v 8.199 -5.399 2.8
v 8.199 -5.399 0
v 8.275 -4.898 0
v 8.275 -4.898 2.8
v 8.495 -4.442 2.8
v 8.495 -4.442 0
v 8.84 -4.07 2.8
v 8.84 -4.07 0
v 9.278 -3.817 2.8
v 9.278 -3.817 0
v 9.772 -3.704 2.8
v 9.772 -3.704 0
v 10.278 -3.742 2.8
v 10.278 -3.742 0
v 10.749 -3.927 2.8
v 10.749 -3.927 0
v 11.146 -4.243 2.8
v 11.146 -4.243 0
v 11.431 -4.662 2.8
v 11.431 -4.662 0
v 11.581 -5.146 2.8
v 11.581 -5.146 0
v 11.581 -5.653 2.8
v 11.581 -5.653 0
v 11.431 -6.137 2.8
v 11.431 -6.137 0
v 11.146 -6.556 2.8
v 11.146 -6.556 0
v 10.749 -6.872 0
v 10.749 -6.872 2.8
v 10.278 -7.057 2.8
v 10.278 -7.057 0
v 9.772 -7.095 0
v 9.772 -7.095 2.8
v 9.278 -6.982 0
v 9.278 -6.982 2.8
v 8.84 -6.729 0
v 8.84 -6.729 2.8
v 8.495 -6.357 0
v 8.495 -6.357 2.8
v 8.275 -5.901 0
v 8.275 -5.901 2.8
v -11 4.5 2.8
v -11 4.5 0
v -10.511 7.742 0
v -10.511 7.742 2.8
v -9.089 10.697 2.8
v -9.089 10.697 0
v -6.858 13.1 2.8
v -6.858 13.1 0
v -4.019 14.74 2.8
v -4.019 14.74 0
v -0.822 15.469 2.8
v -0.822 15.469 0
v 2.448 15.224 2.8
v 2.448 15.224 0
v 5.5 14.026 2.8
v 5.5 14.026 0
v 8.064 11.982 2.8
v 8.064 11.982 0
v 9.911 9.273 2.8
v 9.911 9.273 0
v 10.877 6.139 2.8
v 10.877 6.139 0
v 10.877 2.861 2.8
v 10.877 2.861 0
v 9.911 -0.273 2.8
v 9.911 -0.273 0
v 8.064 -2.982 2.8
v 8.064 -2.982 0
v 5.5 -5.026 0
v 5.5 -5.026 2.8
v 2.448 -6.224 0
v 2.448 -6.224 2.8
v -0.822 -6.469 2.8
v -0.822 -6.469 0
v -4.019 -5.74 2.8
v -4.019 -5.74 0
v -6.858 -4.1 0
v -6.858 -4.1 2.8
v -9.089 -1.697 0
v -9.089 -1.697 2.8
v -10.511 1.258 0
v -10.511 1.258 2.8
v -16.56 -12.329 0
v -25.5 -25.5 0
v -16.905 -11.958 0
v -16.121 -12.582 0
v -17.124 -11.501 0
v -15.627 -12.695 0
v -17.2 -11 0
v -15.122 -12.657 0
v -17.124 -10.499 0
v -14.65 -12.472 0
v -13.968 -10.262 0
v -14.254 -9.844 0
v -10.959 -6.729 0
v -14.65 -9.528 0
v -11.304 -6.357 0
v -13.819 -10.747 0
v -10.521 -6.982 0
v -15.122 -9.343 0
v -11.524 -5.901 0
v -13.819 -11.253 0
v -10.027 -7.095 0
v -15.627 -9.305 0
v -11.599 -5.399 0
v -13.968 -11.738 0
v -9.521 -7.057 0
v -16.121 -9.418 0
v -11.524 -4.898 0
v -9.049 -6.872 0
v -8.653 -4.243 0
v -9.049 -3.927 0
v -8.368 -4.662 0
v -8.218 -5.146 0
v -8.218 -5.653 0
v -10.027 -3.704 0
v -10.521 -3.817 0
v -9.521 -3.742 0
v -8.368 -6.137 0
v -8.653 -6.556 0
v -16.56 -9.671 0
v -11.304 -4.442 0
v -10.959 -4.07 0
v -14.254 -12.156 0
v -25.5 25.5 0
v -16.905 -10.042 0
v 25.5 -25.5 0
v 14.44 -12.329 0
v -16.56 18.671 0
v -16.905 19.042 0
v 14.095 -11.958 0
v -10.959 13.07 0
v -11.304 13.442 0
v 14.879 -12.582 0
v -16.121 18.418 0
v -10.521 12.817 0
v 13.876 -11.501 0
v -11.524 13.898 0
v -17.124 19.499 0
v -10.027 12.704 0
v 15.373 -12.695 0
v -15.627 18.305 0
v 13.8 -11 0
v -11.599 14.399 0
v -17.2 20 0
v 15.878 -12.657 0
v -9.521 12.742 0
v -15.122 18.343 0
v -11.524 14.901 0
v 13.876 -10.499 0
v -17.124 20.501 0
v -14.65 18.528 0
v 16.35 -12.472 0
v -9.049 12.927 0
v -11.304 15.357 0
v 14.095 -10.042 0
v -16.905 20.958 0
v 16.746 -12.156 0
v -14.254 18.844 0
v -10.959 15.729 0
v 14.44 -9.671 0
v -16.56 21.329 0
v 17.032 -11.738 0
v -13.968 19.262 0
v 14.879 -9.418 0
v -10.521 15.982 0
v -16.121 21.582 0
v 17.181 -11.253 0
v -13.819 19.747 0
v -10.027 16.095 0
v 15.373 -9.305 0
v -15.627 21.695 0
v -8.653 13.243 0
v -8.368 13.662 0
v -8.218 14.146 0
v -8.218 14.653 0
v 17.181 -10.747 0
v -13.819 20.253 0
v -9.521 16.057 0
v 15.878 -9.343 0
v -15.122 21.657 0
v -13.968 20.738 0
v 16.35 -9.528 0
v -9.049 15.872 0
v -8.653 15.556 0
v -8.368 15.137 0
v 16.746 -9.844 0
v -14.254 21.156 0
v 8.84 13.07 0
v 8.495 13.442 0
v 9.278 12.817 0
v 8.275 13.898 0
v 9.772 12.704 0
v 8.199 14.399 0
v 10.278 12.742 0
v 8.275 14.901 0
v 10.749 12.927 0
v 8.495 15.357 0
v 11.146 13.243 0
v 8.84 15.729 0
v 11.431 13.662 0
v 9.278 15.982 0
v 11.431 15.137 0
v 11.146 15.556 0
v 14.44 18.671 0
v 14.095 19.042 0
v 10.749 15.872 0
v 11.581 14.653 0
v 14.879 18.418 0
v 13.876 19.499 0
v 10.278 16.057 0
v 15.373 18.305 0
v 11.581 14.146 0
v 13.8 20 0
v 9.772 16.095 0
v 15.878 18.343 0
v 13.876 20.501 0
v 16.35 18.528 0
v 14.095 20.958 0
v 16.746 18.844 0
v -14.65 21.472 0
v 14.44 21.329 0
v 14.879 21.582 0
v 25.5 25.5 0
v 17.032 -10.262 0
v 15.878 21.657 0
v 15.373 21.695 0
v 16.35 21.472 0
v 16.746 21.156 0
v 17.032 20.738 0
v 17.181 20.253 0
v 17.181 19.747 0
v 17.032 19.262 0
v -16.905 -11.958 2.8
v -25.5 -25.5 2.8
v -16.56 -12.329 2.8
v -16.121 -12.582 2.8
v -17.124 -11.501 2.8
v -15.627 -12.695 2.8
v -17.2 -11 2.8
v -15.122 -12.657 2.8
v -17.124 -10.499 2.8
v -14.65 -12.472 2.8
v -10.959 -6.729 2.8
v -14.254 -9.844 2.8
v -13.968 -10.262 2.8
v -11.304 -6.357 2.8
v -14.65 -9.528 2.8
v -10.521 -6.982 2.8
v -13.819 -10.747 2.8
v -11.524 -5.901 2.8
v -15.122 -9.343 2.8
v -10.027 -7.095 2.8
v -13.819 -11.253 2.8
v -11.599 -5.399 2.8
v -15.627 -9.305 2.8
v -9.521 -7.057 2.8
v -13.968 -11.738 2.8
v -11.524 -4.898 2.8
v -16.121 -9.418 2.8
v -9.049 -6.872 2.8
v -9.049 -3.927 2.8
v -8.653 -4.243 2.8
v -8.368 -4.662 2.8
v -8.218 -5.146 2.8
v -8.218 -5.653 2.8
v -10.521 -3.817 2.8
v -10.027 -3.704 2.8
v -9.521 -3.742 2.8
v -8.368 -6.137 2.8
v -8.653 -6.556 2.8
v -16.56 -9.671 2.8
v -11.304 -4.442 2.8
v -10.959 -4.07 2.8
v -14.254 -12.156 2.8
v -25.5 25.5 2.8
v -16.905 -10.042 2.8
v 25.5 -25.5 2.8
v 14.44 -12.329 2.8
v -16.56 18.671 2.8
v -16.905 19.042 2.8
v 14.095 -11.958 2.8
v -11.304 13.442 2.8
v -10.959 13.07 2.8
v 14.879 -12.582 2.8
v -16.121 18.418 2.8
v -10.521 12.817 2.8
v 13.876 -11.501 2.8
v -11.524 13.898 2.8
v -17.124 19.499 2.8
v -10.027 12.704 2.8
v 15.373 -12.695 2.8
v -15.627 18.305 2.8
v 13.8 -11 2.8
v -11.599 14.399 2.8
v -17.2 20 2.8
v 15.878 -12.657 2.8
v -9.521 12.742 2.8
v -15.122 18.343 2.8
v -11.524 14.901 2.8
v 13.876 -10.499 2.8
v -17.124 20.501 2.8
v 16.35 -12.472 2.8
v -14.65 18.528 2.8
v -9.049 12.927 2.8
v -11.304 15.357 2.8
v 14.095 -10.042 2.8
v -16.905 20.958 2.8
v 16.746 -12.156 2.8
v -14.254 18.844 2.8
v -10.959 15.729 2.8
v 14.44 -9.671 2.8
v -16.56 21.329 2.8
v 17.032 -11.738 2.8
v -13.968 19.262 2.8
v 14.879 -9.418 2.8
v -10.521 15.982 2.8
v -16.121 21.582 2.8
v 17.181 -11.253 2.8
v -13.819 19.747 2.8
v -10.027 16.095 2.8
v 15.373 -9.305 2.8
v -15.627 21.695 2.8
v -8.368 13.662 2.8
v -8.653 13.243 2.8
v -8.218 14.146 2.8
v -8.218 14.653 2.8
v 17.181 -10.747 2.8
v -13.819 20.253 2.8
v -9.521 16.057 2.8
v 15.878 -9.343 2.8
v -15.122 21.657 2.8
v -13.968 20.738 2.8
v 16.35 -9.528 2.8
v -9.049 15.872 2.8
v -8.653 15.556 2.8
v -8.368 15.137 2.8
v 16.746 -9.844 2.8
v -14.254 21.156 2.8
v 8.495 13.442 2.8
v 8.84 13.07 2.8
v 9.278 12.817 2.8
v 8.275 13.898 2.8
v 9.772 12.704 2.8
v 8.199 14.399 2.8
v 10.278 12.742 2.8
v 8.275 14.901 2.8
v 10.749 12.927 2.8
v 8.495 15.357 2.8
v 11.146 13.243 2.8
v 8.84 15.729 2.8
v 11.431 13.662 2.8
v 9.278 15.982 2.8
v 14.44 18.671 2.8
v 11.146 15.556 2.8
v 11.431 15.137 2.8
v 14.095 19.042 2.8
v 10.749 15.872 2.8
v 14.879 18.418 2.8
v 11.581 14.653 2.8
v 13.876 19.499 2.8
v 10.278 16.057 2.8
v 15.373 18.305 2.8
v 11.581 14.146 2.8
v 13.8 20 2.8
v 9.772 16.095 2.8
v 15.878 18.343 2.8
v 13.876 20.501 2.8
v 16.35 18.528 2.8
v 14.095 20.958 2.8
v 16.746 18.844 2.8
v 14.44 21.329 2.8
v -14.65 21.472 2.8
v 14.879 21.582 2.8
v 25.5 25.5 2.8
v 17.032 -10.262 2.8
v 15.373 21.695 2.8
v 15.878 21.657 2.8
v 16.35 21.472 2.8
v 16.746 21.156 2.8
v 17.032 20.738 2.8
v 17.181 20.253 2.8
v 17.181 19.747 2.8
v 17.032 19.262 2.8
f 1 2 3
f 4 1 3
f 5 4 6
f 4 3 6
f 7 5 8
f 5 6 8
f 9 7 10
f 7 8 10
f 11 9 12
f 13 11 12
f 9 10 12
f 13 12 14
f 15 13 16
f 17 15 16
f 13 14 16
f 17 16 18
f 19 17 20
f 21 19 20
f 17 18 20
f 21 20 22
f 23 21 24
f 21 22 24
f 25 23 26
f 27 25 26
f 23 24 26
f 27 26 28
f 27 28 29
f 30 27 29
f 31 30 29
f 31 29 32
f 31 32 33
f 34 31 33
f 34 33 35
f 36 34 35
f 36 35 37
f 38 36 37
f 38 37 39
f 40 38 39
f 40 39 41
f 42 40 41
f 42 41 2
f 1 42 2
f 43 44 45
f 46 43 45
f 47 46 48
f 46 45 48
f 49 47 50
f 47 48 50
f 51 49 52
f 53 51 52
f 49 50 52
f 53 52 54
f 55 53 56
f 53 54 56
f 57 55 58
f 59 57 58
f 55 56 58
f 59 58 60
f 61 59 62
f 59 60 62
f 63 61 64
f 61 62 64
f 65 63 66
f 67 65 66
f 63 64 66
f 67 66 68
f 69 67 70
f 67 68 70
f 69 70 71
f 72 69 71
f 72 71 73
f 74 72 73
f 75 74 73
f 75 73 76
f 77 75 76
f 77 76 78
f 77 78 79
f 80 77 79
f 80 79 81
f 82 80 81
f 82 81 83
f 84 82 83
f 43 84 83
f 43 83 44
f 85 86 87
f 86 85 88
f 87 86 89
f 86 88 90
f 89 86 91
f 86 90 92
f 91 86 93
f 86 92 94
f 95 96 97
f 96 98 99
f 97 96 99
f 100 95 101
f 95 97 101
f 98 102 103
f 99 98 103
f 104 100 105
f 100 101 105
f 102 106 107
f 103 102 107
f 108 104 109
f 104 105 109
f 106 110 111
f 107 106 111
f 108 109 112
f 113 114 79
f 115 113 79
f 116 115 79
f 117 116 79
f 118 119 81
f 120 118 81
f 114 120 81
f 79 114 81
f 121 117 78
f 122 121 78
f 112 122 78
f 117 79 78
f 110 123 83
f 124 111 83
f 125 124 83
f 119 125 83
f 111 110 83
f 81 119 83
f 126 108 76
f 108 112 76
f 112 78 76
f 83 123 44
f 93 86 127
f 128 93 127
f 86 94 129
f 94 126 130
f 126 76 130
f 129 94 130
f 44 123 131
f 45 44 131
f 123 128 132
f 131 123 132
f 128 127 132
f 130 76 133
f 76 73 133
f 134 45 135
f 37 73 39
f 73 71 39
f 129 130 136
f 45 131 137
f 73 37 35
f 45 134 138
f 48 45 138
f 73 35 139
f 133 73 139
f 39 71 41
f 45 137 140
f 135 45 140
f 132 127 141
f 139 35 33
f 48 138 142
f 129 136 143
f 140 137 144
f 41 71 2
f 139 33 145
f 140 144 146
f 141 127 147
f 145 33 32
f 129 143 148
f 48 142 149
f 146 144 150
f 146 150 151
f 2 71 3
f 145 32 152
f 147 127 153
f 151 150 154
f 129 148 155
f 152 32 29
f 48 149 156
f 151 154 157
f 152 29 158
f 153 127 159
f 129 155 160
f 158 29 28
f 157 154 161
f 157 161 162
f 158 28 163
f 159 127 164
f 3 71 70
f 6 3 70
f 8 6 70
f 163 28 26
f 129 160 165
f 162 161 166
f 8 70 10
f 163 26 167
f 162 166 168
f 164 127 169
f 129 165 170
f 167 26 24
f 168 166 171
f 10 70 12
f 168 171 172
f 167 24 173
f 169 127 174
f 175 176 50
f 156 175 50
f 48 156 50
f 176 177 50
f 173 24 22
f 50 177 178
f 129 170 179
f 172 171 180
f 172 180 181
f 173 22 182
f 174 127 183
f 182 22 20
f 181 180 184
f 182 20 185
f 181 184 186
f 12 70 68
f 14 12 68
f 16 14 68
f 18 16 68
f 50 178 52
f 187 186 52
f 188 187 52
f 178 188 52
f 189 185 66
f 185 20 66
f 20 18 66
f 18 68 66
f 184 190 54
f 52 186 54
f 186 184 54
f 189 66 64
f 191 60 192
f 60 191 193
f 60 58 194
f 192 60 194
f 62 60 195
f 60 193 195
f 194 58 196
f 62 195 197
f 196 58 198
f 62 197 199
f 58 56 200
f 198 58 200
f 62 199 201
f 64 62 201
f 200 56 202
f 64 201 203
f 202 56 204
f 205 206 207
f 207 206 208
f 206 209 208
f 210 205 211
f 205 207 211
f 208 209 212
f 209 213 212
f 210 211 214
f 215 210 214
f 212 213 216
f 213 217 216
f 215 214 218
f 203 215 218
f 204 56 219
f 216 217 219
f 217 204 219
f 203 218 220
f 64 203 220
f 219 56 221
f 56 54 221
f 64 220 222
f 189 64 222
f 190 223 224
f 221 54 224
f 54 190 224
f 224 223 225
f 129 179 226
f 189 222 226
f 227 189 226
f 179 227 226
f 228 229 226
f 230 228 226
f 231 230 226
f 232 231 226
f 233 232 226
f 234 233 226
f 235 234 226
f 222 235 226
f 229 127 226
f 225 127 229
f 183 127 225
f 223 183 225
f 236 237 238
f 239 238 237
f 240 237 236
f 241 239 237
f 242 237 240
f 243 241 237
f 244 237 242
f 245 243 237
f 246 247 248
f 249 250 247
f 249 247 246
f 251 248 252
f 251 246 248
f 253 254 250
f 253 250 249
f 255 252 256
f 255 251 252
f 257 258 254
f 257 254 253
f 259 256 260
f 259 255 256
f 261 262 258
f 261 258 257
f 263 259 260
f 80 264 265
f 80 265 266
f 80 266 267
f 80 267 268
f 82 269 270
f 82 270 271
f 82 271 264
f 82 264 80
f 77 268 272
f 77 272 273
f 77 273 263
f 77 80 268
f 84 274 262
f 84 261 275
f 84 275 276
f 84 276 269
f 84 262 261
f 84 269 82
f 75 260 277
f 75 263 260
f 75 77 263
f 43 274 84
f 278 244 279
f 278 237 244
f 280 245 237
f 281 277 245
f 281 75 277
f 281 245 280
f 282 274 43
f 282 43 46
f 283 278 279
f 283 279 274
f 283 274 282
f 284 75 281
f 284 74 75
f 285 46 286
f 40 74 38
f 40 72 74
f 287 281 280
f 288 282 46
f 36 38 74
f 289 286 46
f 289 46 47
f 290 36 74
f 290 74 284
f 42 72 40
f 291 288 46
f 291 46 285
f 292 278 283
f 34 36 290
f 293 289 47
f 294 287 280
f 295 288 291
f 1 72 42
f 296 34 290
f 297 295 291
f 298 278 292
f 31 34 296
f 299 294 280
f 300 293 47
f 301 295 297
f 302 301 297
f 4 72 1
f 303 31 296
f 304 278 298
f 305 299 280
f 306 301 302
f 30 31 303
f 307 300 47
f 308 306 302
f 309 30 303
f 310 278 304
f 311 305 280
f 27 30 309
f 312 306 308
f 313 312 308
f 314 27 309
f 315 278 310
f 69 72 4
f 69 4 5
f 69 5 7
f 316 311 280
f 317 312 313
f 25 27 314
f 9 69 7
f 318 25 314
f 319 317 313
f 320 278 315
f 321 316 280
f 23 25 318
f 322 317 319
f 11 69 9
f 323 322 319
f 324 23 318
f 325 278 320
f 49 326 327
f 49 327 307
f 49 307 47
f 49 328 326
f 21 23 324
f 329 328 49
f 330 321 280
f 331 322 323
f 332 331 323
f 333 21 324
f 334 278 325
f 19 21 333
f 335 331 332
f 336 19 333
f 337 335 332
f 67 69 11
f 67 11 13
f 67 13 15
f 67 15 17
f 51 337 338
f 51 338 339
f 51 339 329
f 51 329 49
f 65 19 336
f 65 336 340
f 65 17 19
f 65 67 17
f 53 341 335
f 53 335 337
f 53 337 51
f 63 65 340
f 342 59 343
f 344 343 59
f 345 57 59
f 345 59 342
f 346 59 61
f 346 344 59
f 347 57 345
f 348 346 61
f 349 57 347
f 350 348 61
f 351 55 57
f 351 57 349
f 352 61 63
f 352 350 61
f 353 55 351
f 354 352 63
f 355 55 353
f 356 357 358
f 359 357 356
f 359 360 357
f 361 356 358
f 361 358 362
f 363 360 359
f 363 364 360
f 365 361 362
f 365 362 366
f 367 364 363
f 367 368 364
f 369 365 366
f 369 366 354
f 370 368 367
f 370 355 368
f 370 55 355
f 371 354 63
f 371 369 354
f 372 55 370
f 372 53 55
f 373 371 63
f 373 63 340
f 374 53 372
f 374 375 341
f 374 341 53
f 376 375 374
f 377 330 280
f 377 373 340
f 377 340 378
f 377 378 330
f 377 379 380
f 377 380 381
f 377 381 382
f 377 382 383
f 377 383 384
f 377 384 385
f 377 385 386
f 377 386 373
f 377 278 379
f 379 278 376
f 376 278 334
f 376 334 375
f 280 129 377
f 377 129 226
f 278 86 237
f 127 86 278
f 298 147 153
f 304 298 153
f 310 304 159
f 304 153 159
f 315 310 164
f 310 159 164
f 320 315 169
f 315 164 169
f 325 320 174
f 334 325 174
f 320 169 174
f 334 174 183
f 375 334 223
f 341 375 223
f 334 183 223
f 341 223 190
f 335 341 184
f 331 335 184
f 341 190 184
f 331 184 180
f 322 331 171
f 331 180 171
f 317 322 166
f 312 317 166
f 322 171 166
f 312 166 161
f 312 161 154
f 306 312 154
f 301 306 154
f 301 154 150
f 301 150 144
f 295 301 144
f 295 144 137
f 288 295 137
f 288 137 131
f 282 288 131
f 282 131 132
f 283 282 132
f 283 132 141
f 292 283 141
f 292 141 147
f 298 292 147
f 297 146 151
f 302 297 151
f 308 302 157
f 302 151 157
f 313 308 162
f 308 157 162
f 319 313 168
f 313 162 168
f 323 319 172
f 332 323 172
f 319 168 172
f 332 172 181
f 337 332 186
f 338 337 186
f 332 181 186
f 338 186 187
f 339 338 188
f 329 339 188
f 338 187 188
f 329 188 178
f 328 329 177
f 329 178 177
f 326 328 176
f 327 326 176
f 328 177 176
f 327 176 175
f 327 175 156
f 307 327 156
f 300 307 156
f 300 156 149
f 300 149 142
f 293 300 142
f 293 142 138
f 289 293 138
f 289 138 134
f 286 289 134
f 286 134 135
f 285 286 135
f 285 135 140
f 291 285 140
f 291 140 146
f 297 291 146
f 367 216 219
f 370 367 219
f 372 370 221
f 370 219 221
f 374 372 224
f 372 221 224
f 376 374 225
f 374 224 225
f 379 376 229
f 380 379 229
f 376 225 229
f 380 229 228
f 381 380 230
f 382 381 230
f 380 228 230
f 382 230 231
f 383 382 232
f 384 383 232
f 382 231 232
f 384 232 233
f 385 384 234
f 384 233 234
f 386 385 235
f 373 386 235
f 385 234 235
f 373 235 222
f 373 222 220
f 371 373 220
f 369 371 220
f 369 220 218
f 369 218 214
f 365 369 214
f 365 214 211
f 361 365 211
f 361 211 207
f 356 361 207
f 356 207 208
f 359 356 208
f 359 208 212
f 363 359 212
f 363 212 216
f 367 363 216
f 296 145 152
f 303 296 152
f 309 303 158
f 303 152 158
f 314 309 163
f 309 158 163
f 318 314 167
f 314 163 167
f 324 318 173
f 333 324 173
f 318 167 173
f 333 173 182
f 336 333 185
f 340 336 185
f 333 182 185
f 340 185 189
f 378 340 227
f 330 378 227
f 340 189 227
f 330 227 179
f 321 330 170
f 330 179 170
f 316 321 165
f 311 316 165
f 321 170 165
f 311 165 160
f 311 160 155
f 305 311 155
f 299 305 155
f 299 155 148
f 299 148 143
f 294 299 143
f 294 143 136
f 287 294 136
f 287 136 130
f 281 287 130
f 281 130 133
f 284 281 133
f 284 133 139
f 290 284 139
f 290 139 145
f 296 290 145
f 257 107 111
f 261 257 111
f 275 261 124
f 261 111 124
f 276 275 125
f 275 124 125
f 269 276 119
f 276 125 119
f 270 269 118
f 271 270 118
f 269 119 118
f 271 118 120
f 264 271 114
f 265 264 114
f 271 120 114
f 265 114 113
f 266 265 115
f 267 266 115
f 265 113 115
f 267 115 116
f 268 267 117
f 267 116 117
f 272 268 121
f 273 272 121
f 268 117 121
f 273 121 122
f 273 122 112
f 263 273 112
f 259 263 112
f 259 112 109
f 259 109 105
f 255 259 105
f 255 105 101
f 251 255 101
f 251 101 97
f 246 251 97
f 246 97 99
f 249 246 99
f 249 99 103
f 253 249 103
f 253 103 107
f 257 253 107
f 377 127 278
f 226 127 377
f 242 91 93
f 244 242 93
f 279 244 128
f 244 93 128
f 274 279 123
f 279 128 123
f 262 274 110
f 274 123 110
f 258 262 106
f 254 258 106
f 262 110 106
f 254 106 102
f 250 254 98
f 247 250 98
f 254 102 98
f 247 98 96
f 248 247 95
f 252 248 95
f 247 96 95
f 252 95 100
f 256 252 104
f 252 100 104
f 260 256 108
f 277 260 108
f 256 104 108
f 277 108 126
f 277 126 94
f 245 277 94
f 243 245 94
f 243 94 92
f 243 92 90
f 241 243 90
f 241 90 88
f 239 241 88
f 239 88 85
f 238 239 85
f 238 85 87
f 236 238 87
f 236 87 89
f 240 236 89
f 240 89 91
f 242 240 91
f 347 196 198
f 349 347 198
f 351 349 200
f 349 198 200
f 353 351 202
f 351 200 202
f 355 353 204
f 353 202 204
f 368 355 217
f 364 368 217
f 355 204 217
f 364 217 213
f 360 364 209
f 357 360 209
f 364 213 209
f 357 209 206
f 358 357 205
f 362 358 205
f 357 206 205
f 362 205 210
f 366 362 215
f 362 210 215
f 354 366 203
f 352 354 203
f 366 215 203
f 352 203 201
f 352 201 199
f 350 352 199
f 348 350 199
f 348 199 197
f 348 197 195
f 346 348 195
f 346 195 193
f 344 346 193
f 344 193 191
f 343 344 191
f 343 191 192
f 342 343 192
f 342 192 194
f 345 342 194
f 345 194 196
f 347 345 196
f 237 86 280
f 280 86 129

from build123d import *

# Parameters (mm, degrees)
SKETCH1_W           = 51
SKETCH1_H           = 51
BOSS_EXTRUDE1_DEPTH = 2.8
SKETCH2_R           = 11
SKETCH2_R_2         = 1.7
CUT_EXTRUDE1_DEPTH  = 3.8


with BuildPart() as part:
    # Sketch1 → Boss-Extrude1 (new body)
    with BuildSketch(Plane.XY):
        Rectangle(SKETCH1_W, SKETCH1_H)
    extrude(amount=BOSS_EXTRUDE1_DEPTH)

    # Sketch2 → Cut-Extrude1 (cut, through all)
    with BuildSketch(Plane(origin=(0, 0, 0), x_dir=(-1, 0, 0), z_dir=(0, 0, -1))):
        with Locations((0, 4.5)):
            Circle(SKETCH2_R)
        with Locations((-15.5, 20)):
            Circle(SKETCH2_R_2)
        with Locations((15.5, 20)):
            Circle(SKETCH2_R_2)
        with Locations((15.5, -11)):
            Circle(SKETCH2_R_2)
        with Locations((-15.5, -11)):
            Circle(SKETCH2_R_2)
        with Locations((-9.899494937, 14.399494937)):
            Circle(SKETCH2_R_2)
        with Locations((9.899494937, 14.399494937)):
            Circle(SKETCH2_R_2)
        with Locations((9.899494937, -5.399494937)):
            Circle(SKETCH2_R_2)
        with Locations((-9.899494937, -5.399494937)):
            Circle(SKETCH2_R_2)
    extrude(amount=-CUT_EXTRUDE1_DEPTH, mode=Mode.SUBTRACT)


solid = part.part
